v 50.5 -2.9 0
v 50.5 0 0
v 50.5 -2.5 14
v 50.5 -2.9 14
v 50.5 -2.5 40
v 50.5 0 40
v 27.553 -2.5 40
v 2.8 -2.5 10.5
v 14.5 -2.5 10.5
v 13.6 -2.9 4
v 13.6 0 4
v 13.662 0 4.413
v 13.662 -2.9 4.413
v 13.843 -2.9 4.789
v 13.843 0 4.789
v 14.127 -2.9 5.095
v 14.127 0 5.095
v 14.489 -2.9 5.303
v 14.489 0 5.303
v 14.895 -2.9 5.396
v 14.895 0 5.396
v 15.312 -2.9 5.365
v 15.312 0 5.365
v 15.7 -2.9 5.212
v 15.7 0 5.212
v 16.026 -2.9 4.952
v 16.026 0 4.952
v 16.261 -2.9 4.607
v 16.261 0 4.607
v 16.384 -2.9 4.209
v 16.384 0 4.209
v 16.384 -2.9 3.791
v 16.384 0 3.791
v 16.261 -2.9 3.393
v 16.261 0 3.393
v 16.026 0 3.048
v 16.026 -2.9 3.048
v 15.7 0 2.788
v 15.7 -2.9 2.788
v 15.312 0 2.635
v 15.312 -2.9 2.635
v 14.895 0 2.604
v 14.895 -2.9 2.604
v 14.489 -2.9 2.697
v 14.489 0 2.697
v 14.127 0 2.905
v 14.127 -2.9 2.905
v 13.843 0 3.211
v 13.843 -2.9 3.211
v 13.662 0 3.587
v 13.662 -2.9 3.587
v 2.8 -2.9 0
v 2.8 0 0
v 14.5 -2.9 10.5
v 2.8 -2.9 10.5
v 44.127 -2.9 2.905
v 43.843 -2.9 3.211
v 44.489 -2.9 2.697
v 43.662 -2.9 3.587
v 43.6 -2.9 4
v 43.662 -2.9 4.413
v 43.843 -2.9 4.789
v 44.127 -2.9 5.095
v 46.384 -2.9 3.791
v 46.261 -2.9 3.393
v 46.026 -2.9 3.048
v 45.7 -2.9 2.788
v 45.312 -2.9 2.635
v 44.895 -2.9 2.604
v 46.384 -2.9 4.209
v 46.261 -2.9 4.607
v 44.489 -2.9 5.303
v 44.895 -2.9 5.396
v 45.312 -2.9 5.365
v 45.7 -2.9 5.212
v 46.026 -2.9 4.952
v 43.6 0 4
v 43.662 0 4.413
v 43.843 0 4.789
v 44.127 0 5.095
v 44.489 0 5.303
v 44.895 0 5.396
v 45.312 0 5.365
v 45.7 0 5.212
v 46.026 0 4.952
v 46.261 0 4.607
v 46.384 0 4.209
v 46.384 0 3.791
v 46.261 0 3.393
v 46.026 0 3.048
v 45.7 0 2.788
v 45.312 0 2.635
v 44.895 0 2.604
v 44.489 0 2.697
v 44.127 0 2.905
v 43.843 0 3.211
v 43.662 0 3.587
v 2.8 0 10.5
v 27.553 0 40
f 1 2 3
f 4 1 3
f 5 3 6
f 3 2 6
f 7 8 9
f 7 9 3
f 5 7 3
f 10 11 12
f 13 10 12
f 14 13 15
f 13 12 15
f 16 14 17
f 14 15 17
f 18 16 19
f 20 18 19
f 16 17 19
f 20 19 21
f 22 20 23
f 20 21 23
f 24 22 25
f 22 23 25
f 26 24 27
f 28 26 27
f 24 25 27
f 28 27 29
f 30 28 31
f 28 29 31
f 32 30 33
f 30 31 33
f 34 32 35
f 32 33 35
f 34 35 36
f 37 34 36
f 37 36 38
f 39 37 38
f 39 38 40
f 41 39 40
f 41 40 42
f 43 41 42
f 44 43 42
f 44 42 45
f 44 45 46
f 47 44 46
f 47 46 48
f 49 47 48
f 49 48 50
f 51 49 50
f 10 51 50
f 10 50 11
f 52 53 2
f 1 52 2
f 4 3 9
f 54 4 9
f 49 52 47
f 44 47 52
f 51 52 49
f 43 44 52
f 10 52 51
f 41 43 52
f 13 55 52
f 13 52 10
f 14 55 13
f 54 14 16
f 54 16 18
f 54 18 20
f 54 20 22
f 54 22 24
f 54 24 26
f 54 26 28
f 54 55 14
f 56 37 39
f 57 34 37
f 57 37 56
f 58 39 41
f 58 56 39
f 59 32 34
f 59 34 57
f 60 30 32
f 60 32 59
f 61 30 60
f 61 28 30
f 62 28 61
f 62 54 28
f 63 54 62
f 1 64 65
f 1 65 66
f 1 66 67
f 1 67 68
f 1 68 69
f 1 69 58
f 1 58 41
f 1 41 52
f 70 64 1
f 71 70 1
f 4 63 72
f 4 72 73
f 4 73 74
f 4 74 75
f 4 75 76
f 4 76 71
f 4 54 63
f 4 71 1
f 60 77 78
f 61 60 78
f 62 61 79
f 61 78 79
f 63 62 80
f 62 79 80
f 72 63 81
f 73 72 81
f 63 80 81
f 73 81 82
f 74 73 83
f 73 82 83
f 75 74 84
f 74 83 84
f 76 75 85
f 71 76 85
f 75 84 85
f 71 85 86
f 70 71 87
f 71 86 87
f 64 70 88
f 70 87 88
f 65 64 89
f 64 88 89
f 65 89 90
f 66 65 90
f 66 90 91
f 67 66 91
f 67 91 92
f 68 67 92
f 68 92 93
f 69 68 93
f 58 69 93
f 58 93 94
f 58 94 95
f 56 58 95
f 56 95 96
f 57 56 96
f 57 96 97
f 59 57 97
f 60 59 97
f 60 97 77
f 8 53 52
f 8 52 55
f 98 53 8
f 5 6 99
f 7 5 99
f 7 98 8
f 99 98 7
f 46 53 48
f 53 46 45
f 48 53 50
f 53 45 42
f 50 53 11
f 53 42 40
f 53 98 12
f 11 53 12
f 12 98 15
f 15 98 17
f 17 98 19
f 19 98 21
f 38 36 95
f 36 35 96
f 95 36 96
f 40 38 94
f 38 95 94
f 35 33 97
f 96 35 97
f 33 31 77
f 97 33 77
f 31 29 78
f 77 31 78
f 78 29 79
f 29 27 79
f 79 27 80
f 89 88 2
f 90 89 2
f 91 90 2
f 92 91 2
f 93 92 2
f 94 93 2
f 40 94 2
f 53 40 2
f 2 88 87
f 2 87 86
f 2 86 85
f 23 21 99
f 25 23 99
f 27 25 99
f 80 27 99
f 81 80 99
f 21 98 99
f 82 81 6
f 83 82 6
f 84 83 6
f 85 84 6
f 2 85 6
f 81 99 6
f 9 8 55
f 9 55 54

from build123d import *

# Parameters (mm, degrees)
PAD002_DEPTH    = 2.5
SKETCH009_W     = 48
SKETCH009_H     = 10.5
PAD003_DEPTH    = 0.4
SKETCH008_R     = 1.4
POCKET005_DEPTH = 5
POCKET012_DEPTH = 5
PAD008_DEPTH    = 0.4


with BuildPart() as part:
    # Sketch007 (on XZ_Plane001 of Origin002) → Pad002 (new body)
    with BuildSketch(Plane.XZ):
        Polygon((50.5, 0), (50.5, 40), (27.253439, 40), (2.5, 10.5), (2.5, 0), align=None)
    extrude(amount=PAD002_DEPTH)

    # Sketch009 (on Face7 of Pad002) → Pad003 (join)
    with BuildSketch(Plane.XZ.offset(2.5)):
        with Locations((26.5, 5.25)):
            Rectangle(SKETCH009_W, SKETCH009_H)
    extrude(amount=PAD003_DEPTH)

    # Sketch008 (on Face6 of Pad002) → Pocket005 (cut)
    with BuildSketch(Plane(origin=(0, 0, 0), x_dir=(-1, 0, 0), z_dir=(0, 1, 0))):
        with Locations((-45, 4)):
            Circle(SKETCH008_R)
        with Locations((-15, 4)):
            Circle(SKETCH008_R)
    extrude(amount=-POCKET005_DEPTH, mode=Mode.SUBTRACT)

    # Sketch021 (on XZ_Plane001 of Origin002) → Pocket012 (cut)
    with BuildSketch(Plane.XZ):
        Polygon((27.253439, 40), (2.5, 10.5), (2.5, 0), (2.8, 0), (2.8, 10.5), (27.553439, 40), align=None)
    extrude(amount=POCKET012_DEPTH, mode=Mode.SUBTRACT)

    # Sketch022 (on Face4 of Pocket012) → Pad008 (join)
    with BuildSketch(Plane.XZ.offset(2.5)):
        Polygon((14.5, 10.5), (50.5, 10.5), (50.5, 14), align=None)
    extrude(amount=PAD008_DEPTH)


solid = part.part
